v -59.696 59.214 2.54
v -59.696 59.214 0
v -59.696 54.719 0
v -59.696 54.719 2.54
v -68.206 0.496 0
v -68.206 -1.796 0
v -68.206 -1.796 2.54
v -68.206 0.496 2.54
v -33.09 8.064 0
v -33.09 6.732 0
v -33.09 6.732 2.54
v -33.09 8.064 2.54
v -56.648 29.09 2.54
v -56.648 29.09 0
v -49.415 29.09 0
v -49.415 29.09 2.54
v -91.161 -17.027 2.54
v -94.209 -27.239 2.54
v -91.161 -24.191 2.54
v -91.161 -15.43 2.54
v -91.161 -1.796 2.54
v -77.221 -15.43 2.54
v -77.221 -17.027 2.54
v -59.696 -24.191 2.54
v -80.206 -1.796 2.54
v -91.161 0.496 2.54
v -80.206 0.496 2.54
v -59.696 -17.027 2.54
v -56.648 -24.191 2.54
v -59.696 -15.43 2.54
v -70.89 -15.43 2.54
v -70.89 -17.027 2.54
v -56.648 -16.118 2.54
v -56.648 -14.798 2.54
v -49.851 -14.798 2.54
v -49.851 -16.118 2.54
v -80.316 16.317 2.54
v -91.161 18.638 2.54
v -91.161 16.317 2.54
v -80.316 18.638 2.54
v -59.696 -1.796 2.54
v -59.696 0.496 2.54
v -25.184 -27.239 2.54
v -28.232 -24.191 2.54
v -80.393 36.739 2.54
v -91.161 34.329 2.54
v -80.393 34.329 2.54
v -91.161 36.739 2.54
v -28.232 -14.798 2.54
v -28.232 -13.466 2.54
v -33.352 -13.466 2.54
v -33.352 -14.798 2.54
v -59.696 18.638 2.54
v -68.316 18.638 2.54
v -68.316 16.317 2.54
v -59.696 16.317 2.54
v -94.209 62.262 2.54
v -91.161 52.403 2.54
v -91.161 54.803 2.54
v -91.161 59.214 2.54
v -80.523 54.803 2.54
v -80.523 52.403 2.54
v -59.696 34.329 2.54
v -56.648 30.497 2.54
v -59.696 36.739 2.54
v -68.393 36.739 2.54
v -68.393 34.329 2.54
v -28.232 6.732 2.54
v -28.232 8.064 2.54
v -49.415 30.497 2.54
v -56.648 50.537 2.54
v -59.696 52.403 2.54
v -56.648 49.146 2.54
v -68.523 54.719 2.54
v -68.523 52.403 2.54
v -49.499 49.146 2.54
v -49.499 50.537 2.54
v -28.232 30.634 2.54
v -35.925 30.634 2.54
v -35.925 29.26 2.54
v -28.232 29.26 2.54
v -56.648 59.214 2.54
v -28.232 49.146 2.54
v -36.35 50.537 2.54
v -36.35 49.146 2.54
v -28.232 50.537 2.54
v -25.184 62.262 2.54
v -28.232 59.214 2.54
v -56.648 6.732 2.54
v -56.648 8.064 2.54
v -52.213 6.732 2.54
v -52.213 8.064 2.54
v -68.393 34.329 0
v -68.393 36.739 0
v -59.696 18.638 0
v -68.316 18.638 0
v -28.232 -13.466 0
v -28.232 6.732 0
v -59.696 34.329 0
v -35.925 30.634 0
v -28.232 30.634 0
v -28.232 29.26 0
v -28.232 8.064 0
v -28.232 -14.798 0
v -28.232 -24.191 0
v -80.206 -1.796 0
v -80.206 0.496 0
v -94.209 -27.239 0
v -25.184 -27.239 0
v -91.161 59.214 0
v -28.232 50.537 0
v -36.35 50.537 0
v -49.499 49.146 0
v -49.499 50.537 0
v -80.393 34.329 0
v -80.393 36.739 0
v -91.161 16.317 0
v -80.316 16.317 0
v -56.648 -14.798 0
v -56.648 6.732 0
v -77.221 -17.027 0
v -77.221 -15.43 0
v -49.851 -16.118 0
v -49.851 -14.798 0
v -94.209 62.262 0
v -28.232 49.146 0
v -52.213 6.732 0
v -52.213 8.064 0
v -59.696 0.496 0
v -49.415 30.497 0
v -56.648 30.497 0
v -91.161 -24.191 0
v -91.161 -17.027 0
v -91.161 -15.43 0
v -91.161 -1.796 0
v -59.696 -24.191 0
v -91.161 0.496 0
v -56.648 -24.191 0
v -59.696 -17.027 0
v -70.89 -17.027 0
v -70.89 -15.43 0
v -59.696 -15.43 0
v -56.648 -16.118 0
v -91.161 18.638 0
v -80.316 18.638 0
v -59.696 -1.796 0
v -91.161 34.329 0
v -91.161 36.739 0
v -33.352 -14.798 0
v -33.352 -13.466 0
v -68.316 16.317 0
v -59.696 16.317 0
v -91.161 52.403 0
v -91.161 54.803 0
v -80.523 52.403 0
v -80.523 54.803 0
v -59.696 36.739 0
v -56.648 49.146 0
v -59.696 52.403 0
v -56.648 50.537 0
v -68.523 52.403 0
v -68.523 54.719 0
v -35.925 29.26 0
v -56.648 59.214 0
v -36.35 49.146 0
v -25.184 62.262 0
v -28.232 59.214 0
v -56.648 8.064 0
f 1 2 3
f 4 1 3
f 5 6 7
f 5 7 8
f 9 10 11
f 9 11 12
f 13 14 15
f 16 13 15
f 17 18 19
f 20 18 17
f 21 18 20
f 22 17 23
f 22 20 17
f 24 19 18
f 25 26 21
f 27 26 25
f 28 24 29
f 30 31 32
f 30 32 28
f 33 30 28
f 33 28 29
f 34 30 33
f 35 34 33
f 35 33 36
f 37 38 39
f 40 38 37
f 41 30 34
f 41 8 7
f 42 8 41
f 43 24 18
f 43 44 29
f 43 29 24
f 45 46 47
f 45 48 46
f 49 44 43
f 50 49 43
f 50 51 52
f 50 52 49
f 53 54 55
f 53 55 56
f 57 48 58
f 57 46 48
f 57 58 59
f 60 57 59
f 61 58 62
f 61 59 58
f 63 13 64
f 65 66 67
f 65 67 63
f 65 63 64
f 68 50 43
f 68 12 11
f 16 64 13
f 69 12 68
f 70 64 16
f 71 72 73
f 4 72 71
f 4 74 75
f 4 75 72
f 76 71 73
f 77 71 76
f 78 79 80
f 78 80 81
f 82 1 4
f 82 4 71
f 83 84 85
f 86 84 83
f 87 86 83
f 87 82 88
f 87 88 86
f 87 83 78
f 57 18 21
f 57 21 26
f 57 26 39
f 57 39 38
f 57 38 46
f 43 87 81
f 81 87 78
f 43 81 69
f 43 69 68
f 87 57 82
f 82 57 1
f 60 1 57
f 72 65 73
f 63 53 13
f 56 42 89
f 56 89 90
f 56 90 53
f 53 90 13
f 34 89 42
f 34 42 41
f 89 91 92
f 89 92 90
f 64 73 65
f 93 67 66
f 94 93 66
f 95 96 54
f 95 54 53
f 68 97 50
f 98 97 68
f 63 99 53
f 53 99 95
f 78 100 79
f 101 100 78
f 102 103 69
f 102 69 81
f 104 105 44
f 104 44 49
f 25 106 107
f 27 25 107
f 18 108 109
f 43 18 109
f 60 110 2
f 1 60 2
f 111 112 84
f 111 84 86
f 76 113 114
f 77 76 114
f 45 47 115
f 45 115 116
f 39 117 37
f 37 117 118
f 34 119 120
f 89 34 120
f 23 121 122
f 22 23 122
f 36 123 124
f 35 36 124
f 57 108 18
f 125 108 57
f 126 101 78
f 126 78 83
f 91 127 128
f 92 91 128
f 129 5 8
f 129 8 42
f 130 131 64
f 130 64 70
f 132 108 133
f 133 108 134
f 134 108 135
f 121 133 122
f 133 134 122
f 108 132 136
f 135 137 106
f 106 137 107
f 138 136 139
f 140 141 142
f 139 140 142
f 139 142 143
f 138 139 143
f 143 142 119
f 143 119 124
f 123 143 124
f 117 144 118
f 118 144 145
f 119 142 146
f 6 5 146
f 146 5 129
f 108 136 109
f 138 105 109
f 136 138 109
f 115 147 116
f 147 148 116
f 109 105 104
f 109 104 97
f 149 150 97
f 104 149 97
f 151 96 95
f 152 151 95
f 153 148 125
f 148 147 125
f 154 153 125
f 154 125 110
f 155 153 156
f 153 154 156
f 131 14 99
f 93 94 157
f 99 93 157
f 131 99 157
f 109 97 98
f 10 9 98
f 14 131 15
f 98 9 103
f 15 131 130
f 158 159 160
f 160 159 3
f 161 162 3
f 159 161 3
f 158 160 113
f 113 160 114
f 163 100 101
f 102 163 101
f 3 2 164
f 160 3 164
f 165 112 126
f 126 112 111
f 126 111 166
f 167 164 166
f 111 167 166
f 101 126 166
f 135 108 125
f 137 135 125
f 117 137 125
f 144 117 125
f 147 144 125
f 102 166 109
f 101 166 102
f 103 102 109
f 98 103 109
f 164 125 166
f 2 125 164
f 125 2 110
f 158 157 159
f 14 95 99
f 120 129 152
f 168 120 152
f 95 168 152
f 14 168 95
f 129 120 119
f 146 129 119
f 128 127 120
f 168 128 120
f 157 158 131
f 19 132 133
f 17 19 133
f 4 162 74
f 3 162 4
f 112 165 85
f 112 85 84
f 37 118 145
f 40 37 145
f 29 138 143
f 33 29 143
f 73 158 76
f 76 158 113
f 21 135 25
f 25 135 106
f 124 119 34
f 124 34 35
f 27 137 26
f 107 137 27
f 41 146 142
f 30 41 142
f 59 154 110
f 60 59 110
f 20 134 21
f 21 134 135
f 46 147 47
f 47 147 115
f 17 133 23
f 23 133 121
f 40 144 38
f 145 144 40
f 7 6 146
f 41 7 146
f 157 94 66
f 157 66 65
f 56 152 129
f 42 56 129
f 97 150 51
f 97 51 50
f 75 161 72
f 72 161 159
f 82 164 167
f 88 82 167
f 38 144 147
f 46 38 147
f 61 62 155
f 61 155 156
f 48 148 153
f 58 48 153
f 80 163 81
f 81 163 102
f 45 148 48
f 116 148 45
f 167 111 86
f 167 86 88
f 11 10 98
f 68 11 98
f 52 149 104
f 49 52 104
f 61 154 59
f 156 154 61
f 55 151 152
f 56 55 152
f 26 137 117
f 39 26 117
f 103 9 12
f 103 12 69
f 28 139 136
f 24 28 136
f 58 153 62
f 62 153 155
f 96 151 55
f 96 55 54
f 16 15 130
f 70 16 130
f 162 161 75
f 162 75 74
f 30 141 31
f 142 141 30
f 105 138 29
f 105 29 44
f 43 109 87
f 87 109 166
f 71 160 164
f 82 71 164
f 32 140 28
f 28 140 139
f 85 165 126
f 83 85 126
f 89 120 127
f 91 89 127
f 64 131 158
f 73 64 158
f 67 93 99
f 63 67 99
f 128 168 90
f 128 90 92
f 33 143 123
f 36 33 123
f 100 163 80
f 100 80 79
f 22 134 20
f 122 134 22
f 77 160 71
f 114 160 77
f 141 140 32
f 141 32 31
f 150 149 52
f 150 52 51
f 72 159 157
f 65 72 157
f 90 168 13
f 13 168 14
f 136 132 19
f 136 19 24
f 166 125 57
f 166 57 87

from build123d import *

# Parameters (mm, degrees)
SKETCH1_W           = 69.025336674
SKETCH1_H           = 89.501461159
SKETCH1_W_2         = 62.929336674
SKETCH1_H_2         = 83.405461159
SKETCH1_W_3         = 10.637877579
SKETCH1_H_3         = 2.400289179
SKETCH1_W_4         = 10.76808562
SKETCH1_H_4         = 2.410116194
SKETCH1_W_5         = 10.845055727
SKETCH1_H_5         = 2.320385117
SKETCH1_W_6         = 8.61961261
SKETCH1_W_7         = 8.696582717
SKETCH1_W_8         = 7.233122671
SKETCH1_H_6         = 1.406184517
SKETCH1_W_9         = 7.693154637
SKETCH1_H_7         = 1.374601098
SKETCH1_W_10        = 4.85814416
SKETCH1_H_8         = 1.33271236
SKETCH1_W_11        = 5.120398278
SKETCH1_H_9         = 1.332092237
SKETCH1_W_12        = 6.797362186
SKETCH1_H_10        = 1.320409981
SKETCH1_W_13        = 10.954732913
SKETCH1_H_11        = 2.291459462
SKETCH1_W_14        = 13.940499857
SKETCH1_H_12        = 1.597280353
SKETCH1_W_15        = 11.193978309
SKETCH1_W_16        = 8.509935424
SKETCH1_W_17        = 8.826790758
SKETCH1_H_13        = 2.316503995
SKETCH1_W_18        = 8.117773256
SKETCH1_H_14        = 1.391011178
SKETCH1_W_19        = 7.14925004
SKETCH1_W_20        = 4.435758543
BOSS_EXTRUDE1_DEPTH = 2.54


with BuildPart() as part:
    # Sketch1 → Boss-Extrude1 (new body)
    # profile 1 of 20: a face of its own
    with BuildSketch(Plane.XY):
        with Locations((-59.696453639, 17.511447337)):
            Rectangle(SKETCH1_W, SKETCH1_H)
        with Locations((-59.696453639, 17.511447337)):
            Rectangle(SKETCH1_W_2, SKETCH1_H_2, mode=Mode.SUBTRACT)
    # profile 2 of 20: a face of its own
    with BuildSketch(Plane.XY):
        with Locations((-85.842183186, 53.603021221)):
            Rectangle(SKETCH1_W_3, SKETCH1_H_3)
    # profile 3 of 20: a face of its own
    with BuildSketch(Plane.XY):
        with Locations((-85.777079166, 35.533767551)):
            Rectangle(SKETCH1_W_4, SKETCH1_H_4)
    # profile 4 of 20: a face of its own
    with BuildSketch(Plane.XY):
        with Locations((-85.738594113, 17.477618848)):
            Rectangle(SKETCH1_W_5, SKETCH1_H_5)
    # profile 5 of 20: a face of its own
    with BuildSketch(Plane.XY):
        with Locations((-64.006259944, 17.477618848)):
            Rectangle(SKETCH1_W_6, SKETCH1_H_5)
    # profile 6 of 20: a face of its own
    with BuildSketch(Plane.XY):
        with Locations((-64.044744998, 35.533767551)):
            Rectangle(SKETCH1_W_7, SKETCH1_H_4)
    # profile 7 of 20: a face of its own
    with BuildSketch(Plane.XY):
        Polygon((-56.648453639, 59.214177916), (-59.696453639, 59.214177916), (-59.696453639, 54.719380626), (-59.696453639, 52.402876631), (-59.696453639, 36.738825648), (-59.696453639, 34.328709454), (-59.696453639, 18.637811406), (-59.696453639, 16.317426289), (-59.696453639, 0.495724739), (-59.696453639, -1.795734723), (-59.696453639, -15.430210162), (-59.696453639, -17.027490515), (-59.696453639, -24.191283243), (-56.648453639, -24.191283243), (-56.648453639, -16.118247947), (-56.648453639, -14.797837966), (-56.648453639, 6.731660618), (-56.648453639, 8.064372978), (-56.648453639, 29.090462814), (-56.648453639, 30.496647331), (-56.648453639, 49.145727963), (-56.648453639, 50.536739141), align=None)
    # profile 8 of 20: a face of its own
    with BuildSketch(Plane.XY):
        with Locations((-53.031892304, 29.793555073)):
            Rectangle(SKETCH1_W_8, SKETCH1_H_6)
    # profile 9 of 20: a face of its own
    with BuildSketch(Plane.XY):
        with Locations((-32.078362621, 29.946844808)):
            Rectangle(SKETCH1_W_9, SKETCH1_H_7)
    # profile 10 of 20: a face of its own
    with BuildSketch(Plane.XY):
        with Locations((-30.660857382, 7.398016798)):
            Rectangle(SKETCH1_W_10, SKETCH1_H_8)
    # profile 11 of 20: a face of its own
    with BuildSketch(Plane.XY):
        with Locations((-30.791984441, -14.131791848)):
            Rectangle(SKETCH1_W_11, SKETCH1_H_9)
    # profile 12 of 20: a face of its own
    with BuildSketch(Plane.XY):
        with Locations((-53.249772546, -15.458042957)):
            Rectangle(SKETCH1_W_12, SKETCH1_H_10)
    # profile 13 of 20: a face of its own
    with BuildSketch(Plane.XY):
        with Locations((-85.68375552, -0.650004992)):
            Rectangle(SKETCH1_W_13, SKETCH1_H_11)
    # profile 14 of 20: a face of its own
    with BuildSketch(Plane.XY):
        with Locations((-84.190872047, -16.228850339)):
            Rectangle(SKETCH1_W_14, SKETCH1_H_12)
    # profile 15 of 20: a face of its own
    with BuildSketch(Plane.XY):
        with Locations((-65.293442794, -16.228850339)):
            Rectangle(SKETCH1_W_15, SKETCH1_H_12)
    # profile 16 of 20: a face of its own
    with BuildSketch(Plane.XY):
        with Locations((-63.951421351, -0.650004992)):
            Rectangle(SKETCH1_W_16, SKETCH1_H_11)
    # profile 17 of 20: a face of its own
    with BuildSketch(Plane.XY):
        with Locations((-64.109849018, 53.561128629)):
            Rectangle(SKETCH1_W_17, SKETCH1_H_13)
    # profile 18 of 20: a face of its own
    with BuildSketch(Plane.XY):
        with Locations((-32.29067193, 49.841233552)):
            Rectangle(SKETCH1_W_18, SKETCH1_H_14)
    # profile 19 of 20: a face of its own
    with BuildSketch(Plane.XY):
        with Locations((-53.073828619, 49.841233552)):
            Rectangle(SKETCH1_W_19, SKETCH1_H_14)
    # profile 20 of 20: a face of its own
    with BuildSketch(Plane.XY):
        with Locations((-54.430574368, 7.398016798)):
            Rectangle(SKETCH1_W_20, SKETCH1_H_8)
    extrude(amount=BOSS_EXTRUDE1_DEPTH)


solid = part.part
